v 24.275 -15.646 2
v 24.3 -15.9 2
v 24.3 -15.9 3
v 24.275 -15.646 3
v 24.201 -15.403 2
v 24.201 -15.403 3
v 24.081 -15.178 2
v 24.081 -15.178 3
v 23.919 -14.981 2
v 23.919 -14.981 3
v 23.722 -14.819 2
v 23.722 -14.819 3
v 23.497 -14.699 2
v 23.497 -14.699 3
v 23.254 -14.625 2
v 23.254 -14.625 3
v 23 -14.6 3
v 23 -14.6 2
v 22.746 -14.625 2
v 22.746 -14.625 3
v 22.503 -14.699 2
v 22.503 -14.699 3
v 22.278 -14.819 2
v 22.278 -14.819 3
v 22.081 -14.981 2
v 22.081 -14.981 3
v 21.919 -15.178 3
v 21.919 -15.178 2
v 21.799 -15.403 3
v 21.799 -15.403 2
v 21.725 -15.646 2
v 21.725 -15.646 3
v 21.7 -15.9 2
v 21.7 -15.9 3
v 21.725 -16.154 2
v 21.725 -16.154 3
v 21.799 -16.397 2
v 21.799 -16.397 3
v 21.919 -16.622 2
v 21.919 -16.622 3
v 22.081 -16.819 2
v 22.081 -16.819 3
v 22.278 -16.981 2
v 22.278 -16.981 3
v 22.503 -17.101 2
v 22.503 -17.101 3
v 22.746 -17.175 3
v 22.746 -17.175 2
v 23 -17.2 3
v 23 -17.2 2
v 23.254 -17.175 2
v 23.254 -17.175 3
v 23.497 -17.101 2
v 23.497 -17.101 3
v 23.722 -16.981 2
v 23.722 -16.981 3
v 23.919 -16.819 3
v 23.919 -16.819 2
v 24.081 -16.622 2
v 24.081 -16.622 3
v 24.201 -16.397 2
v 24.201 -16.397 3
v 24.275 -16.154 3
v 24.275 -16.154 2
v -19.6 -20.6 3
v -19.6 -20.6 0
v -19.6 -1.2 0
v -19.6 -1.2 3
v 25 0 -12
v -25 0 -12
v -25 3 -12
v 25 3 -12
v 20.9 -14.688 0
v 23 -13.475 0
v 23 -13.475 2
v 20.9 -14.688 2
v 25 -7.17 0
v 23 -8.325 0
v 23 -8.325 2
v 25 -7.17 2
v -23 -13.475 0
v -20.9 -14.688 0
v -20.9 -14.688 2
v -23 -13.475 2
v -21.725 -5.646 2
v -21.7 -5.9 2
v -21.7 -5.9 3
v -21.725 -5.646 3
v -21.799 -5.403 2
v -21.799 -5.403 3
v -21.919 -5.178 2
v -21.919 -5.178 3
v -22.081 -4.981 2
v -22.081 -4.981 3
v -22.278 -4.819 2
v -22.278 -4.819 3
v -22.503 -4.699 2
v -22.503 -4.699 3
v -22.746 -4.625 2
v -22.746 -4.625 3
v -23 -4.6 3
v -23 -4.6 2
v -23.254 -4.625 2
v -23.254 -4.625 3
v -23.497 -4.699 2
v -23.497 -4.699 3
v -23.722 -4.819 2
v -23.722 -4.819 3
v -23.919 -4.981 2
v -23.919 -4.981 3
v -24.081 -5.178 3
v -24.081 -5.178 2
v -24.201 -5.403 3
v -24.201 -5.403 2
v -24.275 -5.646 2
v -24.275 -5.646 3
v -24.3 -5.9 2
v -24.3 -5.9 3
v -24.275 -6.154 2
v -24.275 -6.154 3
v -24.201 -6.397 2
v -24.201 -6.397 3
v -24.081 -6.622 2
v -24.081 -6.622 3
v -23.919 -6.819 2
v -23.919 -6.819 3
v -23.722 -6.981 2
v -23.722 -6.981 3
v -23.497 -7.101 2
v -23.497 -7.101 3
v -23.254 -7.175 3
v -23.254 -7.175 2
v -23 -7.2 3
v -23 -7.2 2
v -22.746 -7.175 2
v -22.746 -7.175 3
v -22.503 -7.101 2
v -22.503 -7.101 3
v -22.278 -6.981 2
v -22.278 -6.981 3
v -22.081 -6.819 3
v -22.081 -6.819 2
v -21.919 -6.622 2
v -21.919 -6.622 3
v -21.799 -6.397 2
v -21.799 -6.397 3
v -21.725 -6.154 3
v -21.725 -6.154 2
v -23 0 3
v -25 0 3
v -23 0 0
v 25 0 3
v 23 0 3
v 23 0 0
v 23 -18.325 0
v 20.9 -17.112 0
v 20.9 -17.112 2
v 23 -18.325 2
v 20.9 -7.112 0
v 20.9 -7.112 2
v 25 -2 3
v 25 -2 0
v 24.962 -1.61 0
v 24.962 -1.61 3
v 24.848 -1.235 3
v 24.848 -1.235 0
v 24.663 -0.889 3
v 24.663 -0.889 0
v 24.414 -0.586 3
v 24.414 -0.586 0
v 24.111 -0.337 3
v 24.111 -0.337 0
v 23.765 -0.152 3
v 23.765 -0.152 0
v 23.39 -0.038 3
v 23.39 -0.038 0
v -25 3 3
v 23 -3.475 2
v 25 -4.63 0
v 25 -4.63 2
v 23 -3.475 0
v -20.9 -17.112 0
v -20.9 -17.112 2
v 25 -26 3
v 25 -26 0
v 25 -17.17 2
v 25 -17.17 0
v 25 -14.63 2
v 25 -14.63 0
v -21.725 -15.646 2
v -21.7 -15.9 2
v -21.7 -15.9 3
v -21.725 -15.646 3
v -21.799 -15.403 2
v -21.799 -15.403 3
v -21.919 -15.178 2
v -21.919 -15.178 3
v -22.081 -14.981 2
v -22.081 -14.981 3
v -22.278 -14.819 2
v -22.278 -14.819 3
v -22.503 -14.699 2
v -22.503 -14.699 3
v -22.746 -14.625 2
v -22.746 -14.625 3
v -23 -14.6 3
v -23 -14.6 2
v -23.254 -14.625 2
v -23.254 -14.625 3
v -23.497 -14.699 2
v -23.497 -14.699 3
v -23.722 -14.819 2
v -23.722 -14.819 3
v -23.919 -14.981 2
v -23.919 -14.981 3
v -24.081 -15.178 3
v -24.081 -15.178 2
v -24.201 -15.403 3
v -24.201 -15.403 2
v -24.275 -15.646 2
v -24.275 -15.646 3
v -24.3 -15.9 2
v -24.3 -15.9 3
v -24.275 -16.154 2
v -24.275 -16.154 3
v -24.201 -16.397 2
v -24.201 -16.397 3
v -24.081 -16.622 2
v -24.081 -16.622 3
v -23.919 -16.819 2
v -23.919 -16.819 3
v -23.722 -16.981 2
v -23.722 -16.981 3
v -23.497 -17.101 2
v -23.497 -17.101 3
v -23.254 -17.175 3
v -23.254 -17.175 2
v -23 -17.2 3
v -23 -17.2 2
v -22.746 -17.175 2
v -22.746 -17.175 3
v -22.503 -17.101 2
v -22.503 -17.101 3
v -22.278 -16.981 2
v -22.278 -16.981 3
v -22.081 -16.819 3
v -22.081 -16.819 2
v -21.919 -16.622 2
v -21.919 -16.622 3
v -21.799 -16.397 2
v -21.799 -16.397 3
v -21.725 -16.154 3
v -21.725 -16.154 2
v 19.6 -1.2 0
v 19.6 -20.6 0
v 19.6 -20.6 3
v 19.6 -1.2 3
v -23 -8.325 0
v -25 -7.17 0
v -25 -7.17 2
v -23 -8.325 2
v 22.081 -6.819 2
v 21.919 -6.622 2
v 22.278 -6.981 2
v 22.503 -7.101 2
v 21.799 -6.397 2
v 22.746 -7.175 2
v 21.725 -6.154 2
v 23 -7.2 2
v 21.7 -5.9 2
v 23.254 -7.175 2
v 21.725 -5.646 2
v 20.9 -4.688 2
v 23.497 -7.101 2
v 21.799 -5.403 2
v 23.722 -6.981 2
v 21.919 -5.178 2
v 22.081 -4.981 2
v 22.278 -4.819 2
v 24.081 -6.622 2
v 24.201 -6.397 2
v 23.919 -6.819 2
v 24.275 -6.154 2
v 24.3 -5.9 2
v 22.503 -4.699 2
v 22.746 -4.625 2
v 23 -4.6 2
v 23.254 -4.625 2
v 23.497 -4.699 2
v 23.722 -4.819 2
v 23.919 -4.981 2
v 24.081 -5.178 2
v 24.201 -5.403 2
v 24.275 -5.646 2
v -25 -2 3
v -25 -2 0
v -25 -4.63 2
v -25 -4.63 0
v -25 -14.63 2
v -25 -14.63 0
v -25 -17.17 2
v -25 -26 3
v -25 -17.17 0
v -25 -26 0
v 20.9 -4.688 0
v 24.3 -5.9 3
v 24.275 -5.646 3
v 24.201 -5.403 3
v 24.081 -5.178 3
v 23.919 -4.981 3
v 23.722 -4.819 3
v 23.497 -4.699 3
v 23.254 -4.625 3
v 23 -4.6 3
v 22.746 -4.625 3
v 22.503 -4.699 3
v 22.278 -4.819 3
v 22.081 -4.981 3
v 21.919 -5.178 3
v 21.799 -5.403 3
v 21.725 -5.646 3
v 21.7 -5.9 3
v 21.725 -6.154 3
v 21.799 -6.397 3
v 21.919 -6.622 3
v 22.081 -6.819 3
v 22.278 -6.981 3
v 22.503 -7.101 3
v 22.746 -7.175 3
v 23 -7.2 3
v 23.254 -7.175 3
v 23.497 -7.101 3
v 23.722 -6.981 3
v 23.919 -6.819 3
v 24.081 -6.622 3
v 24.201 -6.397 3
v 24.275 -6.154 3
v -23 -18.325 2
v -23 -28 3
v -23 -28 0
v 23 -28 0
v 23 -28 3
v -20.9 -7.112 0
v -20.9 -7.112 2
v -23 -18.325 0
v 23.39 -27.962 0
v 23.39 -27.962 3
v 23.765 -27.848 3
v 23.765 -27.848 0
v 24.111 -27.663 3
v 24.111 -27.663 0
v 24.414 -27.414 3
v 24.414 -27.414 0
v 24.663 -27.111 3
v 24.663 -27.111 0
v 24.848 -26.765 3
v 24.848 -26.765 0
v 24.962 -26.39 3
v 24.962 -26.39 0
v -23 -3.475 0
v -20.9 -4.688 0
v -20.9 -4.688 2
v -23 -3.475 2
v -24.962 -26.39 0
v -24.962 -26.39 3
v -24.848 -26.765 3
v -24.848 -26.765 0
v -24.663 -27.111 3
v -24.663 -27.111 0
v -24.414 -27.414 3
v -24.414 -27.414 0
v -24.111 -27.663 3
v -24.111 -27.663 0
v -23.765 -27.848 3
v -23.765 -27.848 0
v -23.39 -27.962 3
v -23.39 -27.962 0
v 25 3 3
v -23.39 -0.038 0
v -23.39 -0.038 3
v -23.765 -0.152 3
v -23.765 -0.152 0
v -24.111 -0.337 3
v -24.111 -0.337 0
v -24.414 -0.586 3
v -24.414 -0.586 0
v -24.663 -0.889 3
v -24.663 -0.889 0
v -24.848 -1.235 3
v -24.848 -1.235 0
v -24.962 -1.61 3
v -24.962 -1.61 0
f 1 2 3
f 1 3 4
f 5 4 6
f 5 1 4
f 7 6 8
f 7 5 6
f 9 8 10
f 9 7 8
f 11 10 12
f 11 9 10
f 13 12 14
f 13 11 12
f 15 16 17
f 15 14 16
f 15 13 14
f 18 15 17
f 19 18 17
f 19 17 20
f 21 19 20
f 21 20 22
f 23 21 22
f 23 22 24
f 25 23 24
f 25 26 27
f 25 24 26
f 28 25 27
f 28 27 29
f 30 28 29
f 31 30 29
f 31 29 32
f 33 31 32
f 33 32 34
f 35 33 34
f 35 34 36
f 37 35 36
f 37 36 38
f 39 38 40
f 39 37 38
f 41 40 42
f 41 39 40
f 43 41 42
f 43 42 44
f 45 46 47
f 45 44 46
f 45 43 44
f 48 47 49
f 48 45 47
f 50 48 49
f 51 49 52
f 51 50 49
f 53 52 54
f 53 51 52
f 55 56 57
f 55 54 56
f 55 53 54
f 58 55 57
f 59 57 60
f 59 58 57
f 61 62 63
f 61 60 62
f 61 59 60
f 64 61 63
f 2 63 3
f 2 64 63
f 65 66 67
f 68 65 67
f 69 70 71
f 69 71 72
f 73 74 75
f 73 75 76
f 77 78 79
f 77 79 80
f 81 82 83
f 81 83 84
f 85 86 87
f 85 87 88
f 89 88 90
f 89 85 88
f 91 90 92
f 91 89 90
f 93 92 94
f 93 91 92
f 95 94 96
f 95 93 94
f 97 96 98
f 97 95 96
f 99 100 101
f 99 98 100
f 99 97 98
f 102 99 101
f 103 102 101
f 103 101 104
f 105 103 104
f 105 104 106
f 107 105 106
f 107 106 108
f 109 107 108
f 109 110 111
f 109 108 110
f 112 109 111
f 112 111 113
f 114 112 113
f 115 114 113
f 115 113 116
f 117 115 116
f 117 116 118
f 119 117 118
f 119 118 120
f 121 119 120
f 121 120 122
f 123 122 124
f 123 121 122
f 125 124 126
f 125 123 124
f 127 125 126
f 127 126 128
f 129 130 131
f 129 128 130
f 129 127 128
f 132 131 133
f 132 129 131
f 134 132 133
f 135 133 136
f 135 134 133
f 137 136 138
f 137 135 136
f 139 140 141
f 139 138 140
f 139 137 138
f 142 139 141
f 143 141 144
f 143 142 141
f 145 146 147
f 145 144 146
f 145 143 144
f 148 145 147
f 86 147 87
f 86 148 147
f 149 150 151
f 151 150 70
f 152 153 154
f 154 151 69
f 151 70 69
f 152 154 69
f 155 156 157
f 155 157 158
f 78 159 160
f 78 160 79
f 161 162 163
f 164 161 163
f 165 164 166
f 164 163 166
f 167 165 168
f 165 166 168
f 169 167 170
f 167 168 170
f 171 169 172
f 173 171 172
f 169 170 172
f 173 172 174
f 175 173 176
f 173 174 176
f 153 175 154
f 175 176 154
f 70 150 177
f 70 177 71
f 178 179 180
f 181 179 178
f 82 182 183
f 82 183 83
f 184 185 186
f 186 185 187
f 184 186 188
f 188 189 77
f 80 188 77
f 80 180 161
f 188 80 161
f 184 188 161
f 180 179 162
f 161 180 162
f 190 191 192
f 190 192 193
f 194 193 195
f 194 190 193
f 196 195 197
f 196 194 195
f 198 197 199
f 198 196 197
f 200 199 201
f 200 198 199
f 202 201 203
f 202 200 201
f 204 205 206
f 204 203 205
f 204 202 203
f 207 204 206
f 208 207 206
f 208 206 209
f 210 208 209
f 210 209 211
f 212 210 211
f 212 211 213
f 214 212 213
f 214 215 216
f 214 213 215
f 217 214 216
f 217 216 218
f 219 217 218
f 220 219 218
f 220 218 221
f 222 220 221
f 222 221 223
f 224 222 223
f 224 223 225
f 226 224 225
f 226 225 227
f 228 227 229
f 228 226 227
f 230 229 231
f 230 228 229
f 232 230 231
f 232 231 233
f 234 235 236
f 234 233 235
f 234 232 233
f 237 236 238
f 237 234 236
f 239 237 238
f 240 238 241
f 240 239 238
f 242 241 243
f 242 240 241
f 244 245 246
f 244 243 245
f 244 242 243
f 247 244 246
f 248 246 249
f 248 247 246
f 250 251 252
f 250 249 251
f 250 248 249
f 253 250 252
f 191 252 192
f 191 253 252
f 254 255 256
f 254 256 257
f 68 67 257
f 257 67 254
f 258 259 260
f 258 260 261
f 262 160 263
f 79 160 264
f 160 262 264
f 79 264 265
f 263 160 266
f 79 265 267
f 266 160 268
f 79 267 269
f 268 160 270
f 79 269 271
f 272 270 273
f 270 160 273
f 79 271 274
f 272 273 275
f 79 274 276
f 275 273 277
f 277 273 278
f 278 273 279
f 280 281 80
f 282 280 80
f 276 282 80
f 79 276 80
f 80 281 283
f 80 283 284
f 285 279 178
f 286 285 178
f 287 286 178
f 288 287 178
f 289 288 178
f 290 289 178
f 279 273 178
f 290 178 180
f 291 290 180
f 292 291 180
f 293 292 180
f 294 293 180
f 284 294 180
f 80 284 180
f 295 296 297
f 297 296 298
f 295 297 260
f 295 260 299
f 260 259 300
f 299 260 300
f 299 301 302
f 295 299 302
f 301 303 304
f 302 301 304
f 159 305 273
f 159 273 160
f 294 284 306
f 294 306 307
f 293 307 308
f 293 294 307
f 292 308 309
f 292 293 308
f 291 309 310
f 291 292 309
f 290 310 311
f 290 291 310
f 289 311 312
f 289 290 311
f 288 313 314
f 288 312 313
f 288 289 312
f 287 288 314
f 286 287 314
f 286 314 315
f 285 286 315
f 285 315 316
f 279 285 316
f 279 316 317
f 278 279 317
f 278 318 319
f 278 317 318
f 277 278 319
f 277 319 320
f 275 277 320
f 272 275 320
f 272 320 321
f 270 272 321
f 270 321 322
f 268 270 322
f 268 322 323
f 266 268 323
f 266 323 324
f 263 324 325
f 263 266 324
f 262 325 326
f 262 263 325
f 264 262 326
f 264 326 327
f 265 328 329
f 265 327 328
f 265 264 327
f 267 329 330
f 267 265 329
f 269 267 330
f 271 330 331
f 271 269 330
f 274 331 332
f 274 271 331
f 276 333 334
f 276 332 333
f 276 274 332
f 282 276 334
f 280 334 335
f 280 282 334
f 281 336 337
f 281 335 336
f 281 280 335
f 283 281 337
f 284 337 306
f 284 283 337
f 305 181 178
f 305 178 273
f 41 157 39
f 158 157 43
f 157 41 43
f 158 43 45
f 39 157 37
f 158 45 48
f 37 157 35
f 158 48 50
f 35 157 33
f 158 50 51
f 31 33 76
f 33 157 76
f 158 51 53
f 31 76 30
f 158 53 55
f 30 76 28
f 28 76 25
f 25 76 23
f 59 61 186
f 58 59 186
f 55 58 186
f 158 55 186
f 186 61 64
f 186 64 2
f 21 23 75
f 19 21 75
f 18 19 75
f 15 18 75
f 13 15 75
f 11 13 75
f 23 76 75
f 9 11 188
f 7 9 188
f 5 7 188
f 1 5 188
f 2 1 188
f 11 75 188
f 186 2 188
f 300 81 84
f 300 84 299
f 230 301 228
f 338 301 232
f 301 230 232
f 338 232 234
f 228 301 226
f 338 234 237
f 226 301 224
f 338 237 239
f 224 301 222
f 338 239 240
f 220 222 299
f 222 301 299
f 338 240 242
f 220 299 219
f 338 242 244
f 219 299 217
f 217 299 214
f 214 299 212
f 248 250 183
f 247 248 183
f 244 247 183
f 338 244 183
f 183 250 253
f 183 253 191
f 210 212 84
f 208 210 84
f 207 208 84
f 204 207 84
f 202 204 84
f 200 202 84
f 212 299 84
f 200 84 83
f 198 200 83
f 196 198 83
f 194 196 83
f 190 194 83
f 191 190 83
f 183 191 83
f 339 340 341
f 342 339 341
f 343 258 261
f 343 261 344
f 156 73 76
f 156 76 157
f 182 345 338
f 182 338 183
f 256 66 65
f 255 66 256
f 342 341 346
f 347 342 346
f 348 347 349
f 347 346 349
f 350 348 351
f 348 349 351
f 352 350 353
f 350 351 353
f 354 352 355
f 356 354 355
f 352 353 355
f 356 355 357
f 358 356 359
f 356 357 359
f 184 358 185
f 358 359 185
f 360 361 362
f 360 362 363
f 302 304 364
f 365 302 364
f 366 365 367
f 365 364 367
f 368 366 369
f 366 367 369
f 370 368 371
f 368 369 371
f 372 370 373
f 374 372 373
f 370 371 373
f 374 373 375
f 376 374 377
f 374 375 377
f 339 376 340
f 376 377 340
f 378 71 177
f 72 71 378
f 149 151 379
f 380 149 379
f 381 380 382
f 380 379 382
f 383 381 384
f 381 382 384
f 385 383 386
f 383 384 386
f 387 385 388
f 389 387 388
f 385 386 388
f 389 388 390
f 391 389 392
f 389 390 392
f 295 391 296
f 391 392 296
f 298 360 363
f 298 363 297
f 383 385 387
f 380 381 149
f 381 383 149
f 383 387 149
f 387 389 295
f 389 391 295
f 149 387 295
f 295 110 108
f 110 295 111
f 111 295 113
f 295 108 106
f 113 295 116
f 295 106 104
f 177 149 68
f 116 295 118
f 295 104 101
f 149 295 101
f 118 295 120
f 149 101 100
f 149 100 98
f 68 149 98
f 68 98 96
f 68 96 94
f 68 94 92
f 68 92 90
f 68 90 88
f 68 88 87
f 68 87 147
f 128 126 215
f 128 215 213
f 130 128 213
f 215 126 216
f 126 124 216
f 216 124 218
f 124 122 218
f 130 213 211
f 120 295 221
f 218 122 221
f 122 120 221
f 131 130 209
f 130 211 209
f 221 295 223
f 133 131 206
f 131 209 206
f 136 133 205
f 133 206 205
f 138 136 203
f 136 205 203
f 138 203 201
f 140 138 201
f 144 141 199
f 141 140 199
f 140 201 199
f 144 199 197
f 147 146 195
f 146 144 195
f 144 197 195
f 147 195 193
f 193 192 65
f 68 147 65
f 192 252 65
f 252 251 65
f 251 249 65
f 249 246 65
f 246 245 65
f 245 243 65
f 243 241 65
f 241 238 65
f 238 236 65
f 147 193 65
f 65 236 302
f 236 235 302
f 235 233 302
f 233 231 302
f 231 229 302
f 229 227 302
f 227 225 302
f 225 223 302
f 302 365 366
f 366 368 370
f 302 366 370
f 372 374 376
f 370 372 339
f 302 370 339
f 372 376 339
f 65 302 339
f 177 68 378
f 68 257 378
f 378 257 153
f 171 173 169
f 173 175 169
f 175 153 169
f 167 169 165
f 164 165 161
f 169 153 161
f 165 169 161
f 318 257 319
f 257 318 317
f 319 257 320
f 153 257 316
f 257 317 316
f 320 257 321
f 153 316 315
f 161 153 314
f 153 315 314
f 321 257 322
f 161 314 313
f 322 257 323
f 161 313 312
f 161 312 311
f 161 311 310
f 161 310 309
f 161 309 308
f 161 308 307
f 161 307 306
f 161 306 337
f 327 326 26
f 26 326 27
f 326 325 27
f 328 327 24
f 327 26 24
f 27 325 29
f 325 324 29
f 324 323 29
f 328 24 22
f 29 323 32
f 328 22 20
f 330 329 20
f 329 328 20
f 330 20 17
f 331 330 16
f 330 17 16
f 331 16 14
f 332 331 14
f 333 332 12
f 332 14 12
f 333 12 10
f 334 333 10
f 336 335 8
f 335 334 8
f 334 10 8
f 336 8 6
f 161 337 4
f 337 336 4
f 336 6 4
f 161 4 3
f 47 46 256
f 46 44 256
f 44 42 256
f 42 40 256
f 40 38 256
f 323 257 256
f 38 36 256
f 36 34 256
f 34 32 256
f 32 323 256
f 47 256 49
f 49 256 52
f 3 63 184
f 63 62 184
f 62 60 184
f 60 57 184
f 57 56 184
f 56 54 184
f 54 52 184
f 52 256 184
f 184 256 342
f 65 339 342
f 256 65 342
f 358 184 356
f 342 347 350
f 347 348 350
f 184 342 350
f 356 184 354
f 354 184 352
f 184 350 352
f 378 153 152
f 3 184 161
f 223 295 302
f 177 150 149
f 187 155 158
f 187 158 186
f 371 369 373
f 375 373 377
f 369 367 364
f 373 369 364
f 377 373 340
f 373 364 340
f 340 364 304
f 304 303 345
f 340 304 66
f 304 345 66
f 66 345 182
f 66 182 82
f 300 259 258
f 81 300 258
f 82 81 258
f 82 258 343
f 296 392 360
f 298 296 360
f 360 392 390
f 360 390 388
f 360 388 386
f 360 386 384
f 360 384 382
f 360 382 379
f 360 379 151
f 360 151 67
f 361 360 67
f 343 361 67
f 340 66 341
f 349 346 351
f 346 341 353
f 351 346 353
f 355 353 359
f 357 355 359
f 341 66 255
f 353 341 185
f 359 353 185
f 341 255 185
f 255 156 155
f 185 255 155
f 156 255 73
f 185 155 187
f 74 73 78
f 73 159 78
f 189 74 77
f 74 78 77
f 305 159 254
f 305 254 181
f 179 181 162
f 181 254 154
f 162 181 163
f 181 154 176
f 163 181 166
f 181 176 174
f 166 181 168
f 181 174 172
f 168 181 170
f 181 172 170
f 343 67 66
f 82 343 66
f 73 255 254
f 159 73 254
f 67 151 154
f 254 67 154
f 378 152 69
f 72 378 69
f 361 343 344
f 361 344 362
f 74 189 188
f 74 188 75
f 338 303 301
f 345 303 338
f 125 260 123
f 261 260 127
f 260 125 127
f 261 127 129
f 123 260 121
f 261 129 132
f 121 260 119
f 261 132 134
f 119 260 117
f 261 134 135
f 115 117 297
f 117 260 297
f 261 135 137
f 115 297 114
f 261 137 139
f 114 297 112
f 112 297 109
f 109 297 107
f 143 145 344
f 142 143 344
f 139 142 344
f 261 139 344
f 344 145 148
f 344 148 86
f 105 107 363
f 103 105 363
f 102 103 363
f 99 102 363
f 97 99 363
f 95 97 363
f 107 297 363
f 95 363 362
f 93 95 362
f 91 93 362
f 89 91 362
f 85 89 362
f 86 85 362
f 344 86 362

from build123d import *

# Parameters (mm, degrees)
BOSS_EXTRUDE1_DEPTH     = 3
CUT_EXTRUDE1_DEPTH      = 38.656340768
CUT_EXTRUDE1_DEPTH_BACK = 38.656340768
SKETCH2_W               = 39.2
SKETCH2_H               = 19.4
CUT_EXTRUDE2_DEPTH      = 38.656340768
CUT_EXTRUDE2_DEPTH_BACK = 38.656340768
SKETCH3_R               = 1.3
CUT_EXTRUDE3_DEPTH      = 2
SKETCH5_W               = 50
SKETCH5_H               = 15
BOSS_EXTRUDE2_DEPTH     = 3


with BuildPart() as part:
    # Sketch1 → Boss-Extrude1 (new body)
    with BuildSketch(Plane.XY):
        with BuildLine():
            Line((-23, -28), (23, -28))
            ThreePointArc((23, -28), (24.414213562, -27.414213562), (25, -26))
            Line((25, -26), (25, -2))
            ThreePointArc((25, -2), (24.414213562, -0.585786438), (23, 0))
            Line((23, 0), (-23, 0))
            ThreePointArc((-23, 0), (-24.414213562, -0.585786438), (-25, -2))
            Line((-25, -2), (-25, -26))
            ThreePointArc((-25, -26), (-24.414213562, -27.414213562), (-23, -28))
        make_face()
    extrude(amount=BOSS_EXTRUDE1_DEPTH)

    # Sketch2 → Cut-Extrude1 (cut, two sides: drawn at the far end of the back side and taken through both)
    with BuildSketch(Plane.XY.offset(-CUT_EXTRUDE1_DEPTH_BACK)):
        with Locations((0, -10.9)):
            Rectangle(SKETCH2_W, SKETCH2_H)
    extrude(amount=CUT_EXTRUDE1_DEPTH + CUT_EXTRUDE1_DEPTH_BACK, mode=Mode.SUBTRACT)

    # Sketch3 → Cut-Extrude2 (cut, two sides: drawn at the far end of the back side and taken through both)
    with BuildSketch(Plane.XY.offset(-CUT_EXTRUDE2_DEPTH_BACK)):
        with Locations((23, -5.9)):
            Circle(SKETCH3_R)
        with Locations((23, -15.9)):
            Circle(SKETCH3_R)
        with Locations((-23, -5.9)):
            Circle(SKETCH3_R)
        with Locations((-23, -15.9)):
            Circle(SKETCH3_R)
    extrude(amount=CUT_EXTRUDE2_DEPTH + CUT_EXTRUDE2_DEPTH_BACK, mode=Mode.SUBTRACT)

    # Sketch4 → Cut-Extrude3 (cut)
    with BuildSketch(Plane.XY):
        Polygon((25.1, -4.687564435), (23, -3.475128869), (20.9, -4.687564435), (20.9, -7.112435565), (23, -8.324871131), (25.1, -7.112435565), align=None)
        Polygon((25.1, -14.687564435), (23, -13.475128869), (20.9, -14.687564435), (20.9, -17.112435565), (23, -18.324871131), (25.1, -17.112435565), align=None)
        Polygon((-20.9, -4.687564435), (-23, -3.475128869), (-25.1, -4.687564435), (-25.1, -7.112435565), (-23, -8.324871131), (-20.9, -7.112435565), align=None)
        Polygon((-20.9, -14.687564435), (-23, -13.475128869), (-25.1, -14.687564435), (-25.1, -17.112435565), (-23, -18.324871131), (-20.9, -17.112435565), align=None)
    extrude(amount=CUT_EXTRUDE3_DEPTH, mode=Mode.SUBTRACT)

    # Sketch5 → Boss-Extrude2 (add)
    with BuildSketch(Plane(origin=(0, 0, 0), x_dir=(1, 0, 0), z_dir=(0, 1, 0))):
        with Locations((0, 4.5)):
            Rectangle(SKETCH5_W, SKETCH5_H)
    extrude(amount=BOSS_EXTRUDE2_DEPTH)


solid = part.part
